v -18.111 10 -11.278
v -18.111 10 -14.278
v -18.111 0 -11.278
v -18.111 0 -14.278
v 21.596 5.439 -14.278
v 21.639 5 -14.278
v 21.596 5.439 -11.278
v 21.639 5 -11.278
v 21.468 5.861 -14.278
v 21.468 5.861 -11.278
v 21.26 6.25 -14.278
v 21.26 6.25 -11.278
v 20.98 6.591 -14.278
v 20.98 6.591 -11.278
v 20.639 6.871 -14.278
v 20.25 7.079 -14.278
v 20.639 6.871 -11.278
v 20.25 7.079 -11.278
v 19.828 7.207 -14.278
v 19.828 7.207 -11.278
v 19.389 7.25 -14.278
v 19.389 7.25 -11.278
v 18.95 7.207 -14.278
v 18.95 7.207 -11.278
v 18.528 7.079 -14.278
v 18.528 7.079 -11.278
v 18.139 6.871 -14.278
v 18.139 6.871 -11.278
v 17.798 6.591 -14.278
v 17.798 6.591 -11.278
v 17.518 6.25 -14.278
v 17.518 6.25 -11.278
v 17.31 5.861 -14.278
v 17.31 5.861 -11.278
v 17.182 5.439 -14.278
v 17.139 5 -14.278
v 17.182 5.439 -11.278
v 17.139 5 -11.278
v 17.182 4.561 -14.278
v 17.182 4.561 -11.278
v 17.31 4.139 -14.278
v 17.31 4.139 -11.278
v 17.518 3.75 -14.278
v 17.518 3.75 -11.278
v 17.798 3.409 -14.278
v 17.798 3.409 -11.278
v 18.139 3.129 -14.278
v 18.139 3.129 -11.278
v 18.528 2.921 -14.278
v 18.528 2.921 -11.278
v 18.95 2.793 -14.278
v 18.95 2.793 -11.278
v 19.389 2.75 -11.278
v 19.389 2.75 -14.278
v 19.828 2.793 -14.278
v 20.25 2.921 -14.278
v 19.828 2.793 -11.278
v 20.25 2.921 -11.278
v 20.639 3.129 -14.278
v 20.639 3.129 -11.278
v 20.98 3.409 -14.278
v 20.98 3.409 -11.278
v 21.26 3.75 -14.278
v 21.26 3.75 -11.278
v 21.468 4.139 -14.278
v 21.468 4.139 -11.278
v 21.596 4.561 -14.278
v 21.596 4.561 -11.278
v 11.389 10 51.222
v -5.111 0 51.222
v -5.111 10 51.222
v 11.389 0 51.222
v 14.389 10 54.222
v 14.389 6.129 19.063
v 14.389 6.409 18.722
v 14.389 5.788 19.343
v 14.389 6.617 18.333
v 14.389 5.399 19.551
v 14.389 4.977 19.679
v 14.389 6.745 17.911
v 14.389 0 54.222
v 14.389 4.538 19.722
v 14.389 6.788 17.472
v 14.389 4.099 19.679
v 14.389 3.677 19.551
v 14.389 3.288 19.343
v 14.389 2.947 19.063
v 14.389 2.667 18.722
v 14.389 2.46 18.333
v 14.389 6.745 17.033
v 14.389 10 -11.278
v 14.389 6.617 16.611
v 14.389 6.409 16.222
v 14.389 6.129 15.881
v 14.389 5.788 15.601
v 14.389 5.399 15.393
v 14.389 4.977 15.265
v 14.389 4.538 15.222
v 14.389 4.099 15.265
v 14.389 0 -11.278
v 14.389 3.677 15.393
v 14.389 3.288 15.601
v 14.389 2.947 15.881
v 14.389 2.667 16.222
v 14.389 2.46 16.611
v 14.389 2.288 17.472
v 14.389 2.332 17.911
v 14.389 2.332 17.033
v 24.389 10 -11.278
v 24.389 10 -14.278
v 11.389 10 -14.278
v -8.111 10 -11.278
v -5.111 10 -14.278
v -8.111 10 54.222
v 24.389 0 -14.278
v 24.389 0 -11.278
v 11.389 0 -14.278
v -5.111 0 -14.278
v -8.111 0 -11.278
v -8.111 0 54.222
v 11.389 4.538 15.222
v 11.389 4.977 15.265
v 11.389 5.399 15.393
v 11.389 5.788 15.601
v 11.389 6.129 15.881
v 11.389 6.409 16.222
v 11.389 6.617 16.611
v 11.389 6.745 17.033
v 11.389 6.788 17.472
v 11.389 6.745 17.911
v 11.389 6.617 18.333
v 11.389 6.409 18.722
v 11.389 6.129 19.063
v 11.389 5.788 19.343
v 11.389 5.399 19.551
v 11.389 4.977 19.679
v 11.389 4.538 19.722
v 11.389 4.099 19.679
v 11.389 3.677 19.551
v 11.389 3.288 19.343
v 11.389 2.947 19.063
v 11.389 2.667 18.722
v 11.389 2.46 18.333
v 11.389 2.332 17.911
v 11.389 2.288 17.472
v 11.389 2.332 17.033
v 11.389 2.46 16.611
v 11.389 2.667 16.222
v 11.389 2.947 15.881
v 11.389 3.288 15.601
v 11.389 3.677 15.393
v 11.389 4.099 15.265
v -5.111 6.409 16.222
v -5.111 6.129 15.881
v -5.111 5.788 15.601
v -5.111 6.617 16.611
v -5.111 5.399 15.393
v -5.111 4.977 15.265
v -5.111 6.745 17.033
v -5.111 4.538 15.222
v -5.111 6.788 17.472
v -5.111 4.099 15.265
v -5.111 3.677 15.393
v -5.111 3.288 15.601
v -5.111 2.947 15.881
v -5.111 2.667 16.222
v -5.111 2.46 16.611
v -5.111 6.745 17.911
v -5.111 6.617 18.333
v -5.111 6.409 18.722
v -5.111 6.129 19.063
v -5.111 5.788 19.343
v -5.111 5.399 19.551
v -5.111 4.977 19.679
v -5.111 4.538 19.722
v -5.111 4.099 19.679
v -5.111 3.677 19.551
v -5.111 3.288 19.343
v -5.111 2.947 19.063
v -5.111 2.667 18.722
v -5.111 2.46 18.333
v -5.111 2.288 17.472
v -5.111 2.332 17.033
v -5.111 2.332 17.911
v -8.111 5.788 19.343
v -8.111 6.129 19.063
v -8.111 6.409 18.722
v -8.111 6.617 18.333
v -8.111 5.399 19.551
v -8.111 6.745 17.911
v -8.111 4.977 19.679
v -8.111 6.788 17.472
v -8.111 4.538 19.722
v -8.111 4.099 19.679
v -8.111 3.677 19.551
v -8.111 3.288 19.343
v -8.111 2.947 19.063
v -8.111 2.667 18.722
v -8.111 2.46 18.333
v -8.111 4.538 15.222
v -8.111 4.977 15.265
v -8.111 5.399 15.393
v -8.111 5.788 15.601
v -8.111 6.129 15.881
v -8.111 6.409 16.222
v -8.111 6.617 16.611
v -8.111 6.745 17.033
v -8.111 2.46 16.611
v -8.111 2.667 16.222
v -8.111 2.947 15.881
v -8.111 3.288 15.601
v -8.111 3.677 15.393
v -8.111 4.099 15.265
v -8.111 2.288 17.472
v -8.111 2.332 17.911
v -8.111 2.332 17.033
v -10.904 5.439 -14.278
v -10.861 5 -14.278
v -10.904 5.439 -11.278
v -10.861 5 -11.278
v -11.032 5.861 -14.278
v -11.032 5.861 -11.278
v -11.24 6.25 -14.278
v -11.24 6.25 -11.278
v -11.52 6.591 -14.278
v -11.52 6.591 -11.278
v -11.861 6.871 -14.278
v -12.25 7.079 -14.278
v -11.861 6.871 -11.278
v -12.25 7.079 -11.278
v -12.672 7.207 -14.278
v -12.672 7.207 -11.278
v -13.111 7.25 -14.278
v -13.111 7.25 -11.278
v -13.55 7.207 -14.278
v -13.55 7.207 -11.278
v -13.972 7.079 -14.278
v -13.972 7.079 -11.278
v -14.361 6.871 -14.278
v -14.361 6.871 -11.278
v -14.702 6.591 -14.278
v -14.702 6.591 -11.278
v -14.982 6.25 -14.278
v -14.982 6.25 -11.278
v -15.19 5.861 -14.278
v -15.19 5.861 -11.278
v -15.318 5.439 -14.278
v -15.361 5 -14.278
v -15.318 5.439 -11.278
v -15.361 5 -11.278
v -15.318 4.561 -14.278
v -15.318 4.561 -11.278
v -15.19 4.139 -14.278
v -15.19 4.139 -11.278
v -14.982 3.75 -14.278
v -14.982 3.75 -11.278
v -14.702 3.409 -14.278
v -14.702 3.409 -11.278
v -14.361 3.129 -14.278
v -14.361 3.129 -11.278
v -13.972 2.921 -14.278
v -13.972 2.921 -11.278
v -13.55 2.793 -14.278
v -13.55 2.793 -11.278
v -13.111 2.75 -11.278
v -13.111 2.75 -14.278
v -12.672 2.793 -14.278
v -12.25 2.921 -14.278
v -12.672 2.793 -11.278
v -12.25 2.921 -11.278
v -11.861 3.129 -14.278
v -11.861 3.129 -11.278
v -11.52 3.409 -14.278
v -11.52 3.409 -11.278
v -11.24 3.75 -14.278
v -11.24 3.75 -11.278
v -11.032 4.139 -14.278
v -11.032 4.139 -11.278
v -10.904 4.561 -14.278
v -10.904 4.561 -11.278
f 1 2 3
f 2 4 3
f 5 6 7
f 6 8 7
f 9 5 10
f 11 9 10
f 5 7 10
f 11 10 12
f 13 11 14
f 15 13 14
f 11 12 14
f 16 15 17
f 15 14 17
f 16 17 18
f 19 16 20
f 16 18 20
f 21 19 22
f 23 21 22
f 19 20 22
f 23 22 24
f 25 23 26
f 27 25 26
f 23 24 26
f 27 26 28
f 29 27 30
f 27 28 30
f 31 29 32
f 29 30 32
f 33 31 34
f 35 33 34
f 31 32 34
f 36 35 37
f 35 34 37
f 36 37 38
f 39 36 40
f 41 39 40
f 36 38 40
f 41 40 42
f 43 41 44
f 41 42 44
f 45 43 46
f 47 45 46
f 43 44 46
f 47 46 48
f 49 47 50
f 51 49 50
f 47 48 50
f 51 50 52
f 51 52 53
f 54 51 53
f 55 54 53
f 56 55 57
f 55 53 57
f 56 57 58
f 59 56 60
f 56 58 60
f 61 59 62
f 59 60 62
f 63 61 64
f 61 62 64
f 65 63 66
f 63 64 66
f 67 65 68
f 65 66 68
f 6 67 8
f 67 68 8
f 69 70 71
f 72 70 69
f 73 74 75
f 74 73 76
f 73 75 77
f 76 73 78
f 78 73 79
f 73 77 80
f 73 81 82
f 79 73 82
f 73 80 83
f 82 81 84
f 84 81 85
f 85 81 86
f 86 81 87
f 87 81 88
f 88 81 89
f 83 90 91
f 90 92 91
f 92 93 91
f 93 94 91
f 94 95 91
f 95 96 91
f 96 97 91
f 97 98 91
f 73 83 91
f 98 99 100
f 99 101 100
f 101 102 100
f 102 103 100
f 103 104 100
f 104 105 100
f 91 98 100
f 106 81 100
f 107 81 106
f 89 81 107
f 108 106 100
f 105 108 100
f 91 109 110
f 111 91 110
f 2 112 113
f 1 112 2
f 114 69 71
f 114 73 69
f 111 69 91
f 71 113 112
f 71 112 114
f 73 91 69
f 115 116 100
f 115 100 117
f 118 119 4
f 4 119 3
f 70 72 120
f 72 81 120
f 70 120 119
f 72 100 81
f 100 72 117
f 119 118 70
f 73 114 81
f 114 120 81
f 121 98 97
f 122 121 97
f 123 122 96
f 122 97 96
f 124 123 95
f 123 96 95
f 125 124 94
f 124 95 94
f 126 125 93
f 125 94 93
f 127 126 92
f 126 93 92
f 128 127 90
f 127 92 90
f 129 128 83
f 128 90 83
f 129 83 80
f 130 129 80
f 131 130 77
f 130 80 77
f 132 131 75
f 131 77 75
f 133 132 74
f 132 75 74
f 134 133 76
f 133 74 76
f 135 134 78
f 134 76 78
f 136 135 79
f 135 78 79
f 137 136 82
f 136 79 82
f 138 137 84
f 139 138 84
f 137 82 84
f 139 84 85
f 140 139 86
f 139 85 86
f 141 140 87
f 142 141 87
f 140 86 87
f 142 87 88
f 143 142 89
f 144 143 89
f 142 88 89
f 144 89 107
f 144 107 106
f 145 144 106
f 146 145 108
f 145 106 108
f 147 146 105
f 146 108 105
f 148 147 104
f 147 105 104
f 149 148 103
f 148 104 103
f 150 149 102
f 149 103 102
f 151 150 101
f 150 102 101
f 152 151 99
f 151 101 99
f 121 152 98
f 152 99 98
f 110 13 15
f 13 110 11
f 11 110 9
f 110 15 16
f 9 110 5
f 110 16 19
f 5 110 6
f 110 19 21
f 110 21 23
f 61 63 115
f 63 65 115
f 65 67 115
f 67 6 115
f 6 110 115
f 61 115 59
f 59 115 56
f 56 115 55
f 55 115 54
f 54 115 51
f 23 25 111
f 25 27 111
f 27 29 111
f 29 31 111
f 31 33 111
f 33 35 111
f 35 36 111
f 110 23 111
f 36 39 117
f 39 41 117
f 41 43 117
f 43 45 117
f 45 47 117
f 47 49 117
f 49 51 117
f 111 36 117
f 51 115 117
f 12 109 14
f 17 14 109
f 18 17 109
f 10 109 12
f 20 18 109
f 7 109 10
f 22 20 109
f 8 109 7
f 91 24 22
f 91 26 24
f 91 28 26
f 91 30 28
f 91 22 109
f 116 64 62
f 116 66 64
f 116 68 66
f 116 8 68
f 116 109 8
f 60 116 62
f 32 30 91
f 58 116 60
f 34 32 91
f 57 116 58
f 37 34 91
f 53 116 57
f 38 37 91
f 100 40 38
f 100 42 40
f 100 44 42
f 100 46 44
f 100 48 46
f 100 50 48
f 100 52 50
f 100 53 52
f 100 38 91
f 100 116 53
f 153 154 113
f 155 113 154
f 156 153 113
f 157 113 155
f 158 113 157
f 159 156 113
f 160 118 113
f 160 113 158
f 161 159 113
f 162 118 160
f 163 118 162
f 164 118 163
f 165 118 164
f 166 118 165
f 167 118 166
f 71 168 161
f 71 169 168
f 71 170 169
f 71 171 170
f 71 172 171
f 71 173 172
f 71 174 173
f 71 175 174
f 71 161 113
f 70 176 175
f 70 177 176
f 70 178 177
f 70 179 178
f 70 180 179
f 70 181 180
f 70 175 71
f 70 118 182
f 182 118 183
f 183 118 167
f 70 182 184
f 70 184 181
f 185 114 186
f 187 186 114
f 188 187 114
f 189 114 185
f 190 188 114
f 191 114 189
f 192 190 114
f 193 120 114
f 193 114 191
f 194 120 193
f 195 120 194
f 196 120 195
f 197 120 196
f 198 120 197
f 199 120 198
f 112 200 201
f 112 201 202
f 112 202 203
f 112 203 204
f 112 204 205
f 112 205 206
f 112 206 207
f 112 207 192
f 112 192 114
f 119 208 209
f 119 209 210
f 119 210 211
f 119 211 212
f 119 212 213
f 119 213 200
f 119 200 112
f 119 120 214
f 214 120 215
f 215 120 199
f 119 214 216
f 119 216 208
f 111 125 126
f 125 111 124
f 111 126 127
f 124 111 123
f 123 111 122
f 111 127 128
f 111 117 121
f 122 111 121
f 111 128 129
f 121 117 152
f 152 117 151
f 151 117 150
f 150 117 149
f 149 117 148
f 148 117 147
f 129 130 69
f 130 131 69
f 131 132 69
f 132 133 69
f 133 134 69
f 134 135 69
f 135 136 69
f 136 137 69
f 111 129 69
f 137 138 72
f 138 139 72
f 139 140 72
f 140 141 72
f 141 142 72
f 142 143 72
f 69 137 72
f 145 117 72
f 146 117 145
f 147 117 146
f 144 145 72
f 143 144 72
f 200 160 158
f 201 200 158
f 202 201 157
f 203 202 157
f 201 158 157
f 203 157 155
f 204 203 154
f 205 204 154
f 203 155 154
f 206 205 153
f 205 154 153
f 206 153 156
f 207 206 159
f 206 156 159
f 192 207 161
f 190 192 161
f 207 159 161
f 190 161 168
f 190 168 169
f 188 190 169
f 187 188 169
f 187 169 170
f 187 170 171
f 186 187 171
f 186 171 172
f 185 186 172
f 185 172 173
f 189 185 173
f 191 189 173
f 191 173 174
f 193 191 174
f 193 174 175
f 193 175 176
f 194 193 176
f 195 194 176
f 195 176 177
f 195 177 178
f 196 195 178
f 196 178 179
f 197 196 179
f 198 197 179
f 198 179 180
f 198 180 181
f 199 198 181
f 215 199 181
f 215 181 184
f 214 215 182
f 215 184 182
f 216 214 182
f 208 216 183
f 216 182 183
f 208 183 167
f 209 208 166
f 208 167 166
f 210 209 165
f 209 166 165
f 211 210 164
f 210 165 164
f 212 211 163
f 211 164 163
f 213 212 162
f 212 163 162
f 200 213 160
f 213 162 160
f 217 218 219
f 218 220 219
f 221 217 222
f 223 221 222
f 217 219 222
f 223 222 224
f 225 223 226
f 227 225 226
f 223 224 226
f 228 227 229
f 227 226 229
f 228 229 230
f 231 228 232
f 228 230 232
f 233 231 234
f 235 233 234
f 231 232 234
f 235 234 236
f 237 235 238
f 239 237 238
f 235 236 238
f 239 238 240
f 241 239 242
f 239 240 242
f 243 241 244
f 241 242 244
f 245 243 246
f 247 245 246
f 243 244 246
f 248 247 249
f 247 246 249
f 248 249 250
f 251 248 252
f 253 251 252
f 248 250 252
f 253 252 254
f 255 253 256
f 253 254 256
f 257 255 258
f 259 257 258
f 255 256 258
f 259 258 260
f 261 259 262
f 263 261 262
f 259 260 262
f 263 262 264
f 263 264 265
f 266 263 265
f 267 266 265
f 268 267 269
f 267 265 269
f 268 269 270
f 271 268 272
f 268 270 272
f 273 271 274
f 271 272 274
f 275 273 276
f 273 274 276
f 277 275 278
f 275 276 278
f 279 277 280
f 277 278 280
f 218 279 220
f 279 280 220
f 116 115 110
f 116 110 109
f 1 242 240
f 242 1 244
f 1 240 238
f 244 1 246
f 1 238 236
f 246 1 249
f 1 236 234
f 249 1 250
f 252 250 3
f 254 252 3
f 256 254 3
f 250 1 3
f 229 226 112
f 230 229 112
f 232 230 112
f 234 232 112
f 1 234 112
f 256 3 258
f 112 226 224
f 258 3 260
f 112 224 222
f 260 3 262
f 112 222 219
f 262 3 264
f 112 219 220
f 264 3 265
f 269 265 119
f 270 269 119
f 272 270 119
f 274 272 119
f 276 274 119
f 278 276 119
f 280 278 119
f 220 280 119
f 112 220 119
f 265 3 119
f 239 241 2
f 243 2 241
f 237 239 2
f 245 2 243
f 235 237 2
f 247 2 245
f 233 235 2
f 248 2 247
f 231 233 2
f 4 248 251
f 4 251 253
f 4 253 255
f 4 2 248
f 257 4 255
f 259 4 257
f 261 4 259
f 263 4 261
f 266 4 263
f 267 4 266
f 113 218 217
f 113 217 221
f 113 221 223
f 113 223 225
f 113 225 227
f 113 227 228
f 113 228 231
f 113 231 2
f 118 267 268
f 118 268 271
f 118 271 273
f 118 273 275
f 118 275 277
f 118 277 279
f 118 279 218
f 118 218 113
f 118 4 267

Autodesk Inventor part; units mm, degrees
ref_plane "YZ Plane" through (0, 0, 0) normal (1, 0, 0) x (0, 1, 0)
ref_plane "XZ Plane" through (0, 0, 0) normal (0, 1, 0) x (-1, 0, 0)
ref_plane "XY Plane" through (0, 0, 0) normal (0, 0, 1) x (1, 0, 0)
sketch "Sketch1" plane through (0, 0, 0) normal (0, 1, 0) x (-1, 0, 0)
  line L0 (-14.3889, -14.2778) -> (-11.3889, -14.2778)
  line L1 (-11.3889, -14.2778) -> (-11.3889, 54.2222)
  line L2 (-11.3889, 54.2222) -> (-14.3889, 54.2222)
  line L3 (-14.3889, 54.2222) -> (-14.3889, -14.2778)
  line L4 (-11.3889, 54.2222) -> (5.1111, 54.2222)
  line L5 (5.1111, 54.2222) -> (5.1111, 51.2222)
  line L6 (5.1111, 51.2222) -> (-11.3889, 51.2222)
  line L7 (-11.3889, 51.2222) -> (-11.3889, 54.2222)
  line L8 (5.1111, 54.2222) -> (8.1111, 54.2222)
  line L9 (8.1111, 54.2222) -> (8.1111, -14.2778)
  line L10 (8.1111, -14.2778) -> (5.1111, -14.2778)
  line L11 (5.1111, -14.2778) -> (5.1111, 54.2222)
  line L12 (8.1111, -14.2778) -> (18.1111, -14.2778)
  line L13 (18.1111, -14.2778) -> (18.1111, -11.2778)
  line L14 (18.1111, -11.2778) -> (8.1111, -11.2778)
  line L15 (8.1111, -11.2778) -> (8.1111, -14.2778)
  line L16 (-14.3889, -14.2778) -> (-24.3889, -14.2778)
  line L17 (-24.3889, -14.2778) -> (-24.3889, -11.2778)
  line L18 (-24.3889, -11.2778) -> (-14.3889, -11.2778)
  line L19 (-14.3889, -11.2778) -> (-14.3889, -14.2778)
  point P0 (0, 0)
  dimension "d0" = 10
  dimension "d1" = 10
  dimension "d2" = 3
  dimension "d3" = 3
  dimension "d4" = 3
  dimension "d5" = 3
  dimension "d6" = 3
  dimension "d7" = 68.5
  dimension "d8" = 16.5
extrude "Extrusion1" add sketch "Sketch1" along normal blind 10
sketch "Sketch2" plane through (14.3889, 0, 54.2222) normal (1, 0, 0) x (0, 0, -1)
  line L0 (0, 10) -> (65.5, 10) projected
  line L1 (0, 0) -> (65.5, 0) projected
  line L2 (31.75, 14.4261) -> (31.75, -5.3494)
  line L3 (68.5, 0) -> (68.5, 10) projected
  circle A0 centre (36.75, 4.5383) radius 2.25
  line L4 (31.75, 4.5383) -> (48.4854, 4.5383)
  point P0 (54.2222, 0)
  dimension "d11" = 36.75
  dimension "d12" = 4.5
  dimension "d13" = 5
extrude "Extrusion2" cut sketch "Sketch2" against normal blind 40
sketch "Sketch3" plane through (14.3889, 0, -11.2778) normal (0, 0, 1) x (1, 0, 0)
  circle A0 centre (5, 5) radius 2.25
  point P0 (-14.3889, 0)
  dimension "d16" = 4.5
extrude "Extrusion3" cut sketch "Sketch3" against normal blind 3
sketch "Sketch4" plane through (-18.1111, 0, -11.2778) normal (0, 0, 1) x (1, 0, 0)
  circle A0 centre (5, 5) radius 2.25
  point P0 (18.1111, 0)
  dimension "d19" = 4.5
extrude "Extrusion4" cut sketch "Sketch4" against normal blind 3
properties part number "BarClip"
